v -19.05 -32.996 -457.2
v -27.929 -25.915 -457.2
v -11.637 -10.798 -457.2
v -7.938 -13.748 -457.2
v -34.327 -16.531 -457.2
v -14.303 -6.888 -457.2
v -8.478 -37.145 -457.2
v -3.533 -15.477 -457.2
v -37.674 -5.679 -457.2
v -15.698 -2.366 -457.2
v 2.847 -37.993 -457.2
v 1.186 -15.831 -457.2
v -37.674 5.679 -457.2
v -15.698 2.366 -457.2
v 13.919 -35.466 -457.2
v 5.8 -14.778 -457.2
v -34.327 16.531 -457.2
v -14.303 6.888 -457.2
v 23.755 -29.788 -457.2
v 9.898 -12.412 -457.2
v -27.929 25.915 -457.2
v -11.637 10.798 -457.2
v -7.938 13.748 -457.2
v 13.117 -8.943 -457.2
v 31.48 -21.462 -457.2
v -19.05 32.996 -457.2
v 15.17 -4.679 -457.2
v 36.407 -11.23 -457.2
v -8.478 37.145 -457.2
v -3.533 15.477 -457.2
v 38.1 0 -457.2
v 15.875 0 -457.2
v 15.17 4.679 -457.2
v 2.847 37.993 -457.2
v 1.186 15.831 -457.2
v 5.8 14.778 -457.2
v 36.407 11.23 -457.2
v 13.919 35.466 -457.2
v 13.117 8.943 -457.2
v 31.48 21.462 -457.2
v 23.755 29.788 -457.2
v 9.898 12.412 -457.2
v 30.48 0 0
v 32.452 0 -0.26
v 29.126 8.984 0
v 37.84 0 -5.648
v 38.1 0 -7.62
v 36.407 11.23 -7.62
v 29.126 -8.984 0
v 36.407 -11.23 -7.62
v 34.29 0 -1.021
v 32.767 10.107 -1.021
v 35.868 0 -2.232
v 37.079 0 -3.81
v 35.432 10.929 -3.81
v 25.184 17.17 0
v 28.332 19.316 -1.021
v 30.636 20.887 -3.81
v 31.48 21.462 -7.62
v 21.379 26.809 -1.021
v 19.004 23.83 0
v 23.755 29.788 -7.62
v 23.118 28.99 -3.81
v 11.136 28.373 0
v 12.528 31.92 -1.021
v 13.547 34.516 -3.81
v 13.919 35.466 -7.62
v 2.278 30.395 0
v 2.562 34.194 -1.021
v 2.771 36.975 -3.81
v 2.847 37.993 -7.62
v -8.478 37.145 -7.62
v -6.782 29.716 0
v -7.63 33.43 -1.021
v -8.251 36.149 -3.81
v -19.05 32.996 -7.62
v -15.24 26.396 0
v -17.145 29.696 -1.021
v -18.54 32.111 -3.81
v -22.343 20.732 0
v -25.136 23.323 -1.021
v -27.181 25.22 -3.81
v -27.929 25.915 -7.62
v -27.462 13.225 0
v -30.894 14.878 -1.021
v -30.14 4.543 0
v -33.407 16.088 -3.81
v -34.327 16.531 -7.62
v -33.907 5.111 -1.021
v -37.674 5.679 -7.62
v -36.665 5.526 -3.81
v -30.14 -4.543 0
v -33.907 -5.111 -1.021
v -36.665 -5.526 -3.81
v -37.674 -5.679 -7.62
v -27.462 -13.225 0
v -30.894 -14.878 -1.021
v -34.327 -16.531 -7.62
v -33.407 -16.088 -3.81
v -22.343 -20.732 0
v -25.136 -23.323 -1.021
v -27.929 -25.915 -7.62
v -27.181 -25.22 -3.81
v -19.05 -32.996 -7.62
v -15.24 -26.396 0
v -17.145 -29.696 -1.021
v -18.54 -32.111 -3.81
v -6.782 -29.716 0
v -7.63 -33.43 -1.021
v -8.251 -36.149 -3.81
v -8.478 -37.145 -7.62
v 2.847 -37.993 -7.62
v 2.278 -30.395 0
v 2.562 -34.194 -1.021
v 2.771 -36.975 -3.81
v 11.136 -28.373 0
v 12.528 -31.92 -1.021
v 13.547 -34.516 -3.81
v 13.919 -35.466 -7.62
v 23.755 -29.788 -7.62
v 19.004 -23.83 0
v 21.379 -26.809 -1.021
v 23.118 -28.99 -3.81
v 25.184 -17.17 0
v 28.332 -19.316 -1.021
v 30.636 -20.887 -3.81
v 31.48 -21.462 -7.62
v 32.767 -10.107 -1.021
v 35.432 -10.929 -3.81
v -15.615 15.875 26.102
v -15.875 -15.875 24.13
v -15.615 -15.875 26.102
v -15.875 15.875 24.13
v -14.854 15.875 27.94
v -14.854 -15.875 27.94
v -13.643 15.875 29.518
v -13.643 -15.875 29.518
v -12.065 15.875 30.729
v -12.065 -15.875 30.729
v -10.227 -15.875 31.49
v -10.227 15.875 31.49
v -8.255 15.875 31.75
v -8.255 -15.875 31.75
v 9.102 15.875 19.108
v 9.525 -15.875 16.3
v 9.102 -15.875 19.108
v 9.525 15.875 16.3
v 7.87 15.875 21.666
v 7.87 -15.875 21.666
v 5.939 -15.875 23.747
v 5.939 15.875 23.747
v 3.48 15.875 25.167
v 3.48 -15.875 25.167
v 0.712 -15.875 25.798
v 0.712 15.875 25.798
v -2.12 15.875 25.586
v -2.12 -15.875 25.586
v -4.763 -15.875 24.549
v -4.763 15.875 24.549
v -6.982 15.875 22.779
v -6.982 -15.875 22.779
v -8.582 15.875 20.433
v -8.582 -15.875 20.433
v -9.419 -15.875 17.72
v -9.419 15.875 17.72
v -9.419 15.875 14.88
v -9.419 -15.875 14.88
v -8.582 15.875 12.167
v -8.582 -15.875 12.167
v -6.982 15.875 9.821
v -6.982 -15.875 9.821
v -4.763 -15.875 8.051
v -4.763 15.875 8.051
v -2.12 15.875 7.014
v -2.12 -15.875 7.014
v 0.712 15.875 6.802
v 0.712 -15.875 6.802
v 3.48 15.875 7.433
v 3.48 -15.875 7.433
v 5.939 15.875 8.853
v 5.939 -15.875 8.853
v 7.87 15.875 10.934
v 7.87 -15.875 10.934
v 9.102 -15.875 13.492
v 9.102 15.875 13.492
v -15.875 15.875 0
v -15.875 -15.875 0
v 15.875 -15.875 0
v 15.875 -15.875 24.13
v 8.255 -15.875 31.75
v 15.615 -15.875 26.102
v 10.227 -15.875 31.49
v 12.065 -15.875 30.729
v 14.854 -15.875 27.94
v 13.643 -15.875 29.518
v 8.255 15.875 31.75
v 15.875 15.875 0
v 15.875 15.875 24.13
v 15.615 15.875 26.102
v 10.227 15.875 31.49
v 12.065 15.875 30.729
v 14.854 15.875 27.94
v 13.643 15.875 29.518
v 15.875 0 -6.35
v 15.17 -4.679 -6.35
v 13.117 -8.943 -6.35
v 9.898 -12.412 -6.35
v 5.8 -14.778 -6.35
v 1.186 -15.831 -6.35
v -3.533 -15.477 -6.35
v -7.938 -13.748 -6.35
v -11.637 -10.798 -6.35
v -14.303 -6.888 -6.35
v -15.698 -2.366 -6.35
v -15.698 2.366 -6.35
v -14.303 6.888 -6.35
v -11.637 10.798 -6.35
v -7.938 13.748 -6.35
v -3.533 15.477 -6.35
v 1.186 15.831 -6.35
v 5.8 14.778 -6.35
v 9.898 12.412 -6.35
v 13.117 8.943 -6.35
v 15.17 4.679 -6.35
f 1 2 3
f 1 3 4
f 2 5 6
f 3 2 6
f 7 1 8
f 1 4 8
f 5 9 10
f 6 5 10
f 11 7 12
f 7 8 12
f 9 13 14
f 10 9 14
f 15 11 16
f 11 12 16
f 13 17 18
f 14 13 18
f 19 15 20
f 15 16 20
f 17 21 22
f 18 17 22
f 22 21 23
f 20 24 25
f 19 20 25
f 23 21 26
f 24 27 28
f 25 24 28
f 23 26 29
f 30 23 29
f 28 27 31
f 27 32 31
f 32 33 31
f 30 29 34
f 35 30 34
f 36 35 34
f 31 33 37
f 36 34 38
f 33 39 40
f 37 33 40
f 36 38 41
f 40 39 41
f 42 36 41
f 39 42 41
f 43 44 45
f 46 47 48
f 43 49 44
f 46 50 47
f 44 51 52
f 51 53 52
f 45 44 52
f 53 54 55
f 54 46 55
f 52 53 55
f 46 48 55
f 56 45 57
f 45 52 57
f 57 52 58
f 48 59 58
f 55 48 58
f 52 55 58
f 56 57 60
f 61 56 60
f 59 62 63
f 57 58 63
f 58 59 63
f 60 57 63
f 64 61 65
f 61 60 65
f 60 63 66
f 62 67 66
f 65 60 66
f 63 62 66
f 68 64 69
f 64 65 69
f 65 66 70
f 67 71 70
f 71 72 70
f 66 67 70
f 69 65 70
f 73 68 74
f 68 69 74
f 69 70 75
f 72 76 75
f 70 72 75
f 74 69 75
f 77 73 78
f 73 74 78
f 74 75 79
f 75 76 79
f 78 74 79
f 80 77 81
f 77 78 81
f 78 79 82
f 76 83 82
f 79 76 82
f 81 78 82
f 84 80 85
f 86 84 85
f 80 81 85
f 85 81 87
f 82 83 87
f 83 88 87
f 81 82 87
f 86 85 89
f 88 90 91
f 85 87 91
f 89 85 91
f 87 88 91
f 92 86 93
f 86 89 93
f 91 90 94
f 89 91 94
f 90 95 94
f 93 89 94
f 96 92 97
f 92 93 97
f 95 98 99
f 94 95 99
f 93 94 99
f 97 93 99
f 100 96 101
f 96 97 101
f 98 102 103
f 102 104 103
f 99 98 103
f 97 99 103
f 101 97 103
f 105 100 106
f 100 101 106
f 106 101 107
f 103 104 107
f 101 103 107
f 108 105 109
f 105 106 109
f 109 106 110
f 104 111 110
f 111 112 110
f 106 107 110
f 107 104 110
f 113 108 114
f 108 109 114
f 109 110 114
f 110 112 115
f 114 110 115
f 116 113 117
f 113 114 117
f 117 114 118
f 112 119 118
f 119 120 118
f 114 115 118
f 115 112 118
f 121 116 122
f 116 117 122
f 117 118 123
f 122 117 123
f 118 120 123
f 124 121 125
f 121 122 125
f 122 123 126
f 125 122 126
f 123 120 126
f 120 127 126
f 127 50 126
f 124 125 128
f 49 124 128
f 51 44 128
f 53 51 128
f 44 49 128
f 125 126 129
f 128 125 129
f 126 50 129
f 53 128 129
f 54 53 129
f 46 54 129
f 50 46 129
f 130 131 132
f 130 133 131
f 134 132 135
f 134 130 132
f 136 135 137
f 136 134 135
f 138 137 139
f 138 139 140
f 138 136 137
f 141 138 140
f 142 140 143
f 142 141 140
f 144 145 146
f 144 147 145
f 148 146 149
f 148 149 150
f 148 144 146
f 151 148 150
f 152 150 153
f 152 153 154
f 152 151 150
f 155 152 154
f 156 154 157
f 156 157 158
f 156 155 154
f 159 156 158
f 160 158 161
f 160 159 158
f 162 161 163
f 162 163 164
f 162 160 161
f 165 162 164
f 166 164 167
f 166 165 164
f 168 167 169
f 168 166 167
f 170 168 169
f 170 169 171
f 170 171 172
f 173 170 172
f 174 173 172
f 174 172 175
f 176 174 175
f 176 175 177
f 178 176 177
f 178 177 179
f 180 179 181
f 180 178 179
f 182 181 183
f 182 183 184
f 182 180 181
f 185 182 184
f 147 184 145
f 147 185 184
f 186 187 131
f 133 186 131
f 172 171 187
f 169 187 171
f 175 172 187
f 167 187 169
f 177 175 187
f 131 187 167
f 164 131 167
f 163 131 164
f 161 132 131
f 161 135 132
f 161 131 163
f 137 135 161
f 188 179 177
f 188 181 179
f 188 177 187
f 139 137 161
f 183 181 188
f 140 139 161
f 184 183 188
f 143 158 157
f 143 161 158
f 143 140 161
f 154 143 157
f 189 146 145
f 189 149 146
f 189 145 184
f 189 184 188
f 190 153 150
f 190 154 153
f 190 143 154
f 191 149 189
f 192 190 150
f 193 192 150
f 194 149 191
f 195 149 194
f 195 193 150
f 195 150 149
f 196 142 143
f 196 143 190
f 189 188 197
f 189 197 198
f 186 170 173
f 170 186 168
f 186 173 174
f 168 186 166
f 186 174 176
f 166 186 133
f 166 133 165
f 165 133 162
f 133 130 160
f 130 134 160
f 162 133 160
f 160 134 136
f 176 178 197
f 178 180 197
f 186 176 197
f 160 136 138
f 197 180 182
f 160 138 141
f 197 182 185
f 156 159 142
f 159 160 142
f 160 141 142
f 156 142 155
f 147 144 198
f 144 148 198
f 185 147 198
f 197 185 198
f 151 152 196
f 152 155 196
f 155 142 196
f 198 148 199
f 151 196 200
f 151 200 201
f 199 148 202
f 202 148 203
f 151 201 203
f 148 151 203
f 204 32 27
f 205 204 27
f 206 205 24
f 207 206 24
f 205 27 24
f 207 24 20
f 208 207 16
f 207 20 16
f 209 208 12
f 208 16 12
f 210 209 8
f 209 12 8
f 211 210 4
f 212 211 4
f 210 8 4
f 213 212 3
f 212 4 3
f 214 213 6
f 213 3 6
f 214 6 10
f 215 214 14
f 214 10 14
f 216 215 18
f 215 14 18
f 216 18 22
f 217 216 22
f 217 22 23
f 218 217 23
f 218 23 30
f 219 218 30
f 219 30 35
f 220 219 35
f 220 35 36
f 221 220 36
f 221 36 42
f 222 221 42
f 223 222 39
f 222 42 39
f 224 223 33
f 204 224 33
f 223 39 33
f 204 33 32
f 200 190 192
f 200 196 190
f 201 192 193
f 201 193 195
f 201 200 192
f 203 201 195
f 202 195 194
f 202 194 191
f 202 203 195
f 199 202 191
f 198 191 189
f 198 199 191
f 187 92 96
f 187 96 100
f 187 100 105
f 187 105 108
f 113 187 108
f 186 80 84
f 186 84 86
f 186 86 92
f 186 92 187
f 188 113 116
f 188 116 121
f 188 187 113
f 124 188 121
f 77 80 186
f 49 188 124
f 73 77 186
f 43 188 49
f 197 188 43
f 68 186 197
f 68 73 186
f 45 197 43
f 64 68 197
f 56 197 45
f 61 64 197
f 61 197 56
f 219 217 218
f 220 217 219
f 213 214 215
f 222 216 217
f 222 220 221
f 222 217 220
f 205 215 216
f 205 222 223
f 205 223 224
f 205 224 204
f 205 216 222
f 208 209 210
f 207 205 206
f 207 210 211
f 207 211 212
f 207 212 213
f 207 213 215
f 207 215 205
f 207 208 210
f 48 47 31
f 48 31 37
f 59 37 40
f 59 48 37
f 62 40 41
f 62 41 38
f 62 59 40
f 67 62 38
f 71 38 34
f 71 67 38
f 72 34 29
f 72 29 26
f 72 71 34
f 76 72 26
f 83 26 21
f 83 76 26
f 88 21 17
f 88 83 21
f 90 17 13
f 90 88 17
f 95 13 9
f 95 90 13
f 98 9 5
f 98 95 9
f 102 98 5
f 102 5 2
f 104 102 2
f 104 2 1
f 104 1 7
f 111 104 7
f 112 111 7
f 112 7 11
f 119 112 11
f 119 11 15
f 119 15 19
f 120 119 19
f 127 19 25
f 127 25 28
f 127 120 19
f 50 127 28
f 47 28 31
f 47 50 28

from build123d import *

# Parameters (mm, degrees)
F0_R     = 38.1
F1_DEPTH = 457.2
F2_W     = 31.75
F2_H     = 63.5
F2_R     = 9.525
F3_DEPTH = 15.875
F4_R     = 7.62
F5_R     = 15.875
F6_DEPTH = 450.85


with BuildPart() as f1:
    # F0 (on Top) → F1 (new body)
    with BuildSketch(Plane.XY):
        Circle(F0_R)
    extrude(amount=-F1_DEPTH)

    # F2 (on Front) → F3 (join, symmetric)
    with BuildSketch(Plane.XZ):
        Rectangle(F2_W, F2_H)
        with Locations((0, 16.3000393659)):
            Circle(F2_R, mode=Mode.SUBTRACT)
    extrude(amount=F3_DEPTH, both=True)

    # F4
    f4_edges = [f1.edges().sort_by_distance(p)[0] for p in [
        (15.875, 0, 31.75),
        (-15.875, 0, 31.75),
        (-38.1, 0, 0),
    ]]
    fillet(f4_edges, radius=F4_R)

    # F5 (on face) → F6 (cut)
    with BuildSketch(Plane(origin=(0, 0, -457.2), x_dir=(1, 0, 0), z_dir=(0, 0, -1))):
        Circle(F5_R)
    extrude(amount=-F6_DEPTH, mode=Mode.SUBTRACT)


solid = f1.part
